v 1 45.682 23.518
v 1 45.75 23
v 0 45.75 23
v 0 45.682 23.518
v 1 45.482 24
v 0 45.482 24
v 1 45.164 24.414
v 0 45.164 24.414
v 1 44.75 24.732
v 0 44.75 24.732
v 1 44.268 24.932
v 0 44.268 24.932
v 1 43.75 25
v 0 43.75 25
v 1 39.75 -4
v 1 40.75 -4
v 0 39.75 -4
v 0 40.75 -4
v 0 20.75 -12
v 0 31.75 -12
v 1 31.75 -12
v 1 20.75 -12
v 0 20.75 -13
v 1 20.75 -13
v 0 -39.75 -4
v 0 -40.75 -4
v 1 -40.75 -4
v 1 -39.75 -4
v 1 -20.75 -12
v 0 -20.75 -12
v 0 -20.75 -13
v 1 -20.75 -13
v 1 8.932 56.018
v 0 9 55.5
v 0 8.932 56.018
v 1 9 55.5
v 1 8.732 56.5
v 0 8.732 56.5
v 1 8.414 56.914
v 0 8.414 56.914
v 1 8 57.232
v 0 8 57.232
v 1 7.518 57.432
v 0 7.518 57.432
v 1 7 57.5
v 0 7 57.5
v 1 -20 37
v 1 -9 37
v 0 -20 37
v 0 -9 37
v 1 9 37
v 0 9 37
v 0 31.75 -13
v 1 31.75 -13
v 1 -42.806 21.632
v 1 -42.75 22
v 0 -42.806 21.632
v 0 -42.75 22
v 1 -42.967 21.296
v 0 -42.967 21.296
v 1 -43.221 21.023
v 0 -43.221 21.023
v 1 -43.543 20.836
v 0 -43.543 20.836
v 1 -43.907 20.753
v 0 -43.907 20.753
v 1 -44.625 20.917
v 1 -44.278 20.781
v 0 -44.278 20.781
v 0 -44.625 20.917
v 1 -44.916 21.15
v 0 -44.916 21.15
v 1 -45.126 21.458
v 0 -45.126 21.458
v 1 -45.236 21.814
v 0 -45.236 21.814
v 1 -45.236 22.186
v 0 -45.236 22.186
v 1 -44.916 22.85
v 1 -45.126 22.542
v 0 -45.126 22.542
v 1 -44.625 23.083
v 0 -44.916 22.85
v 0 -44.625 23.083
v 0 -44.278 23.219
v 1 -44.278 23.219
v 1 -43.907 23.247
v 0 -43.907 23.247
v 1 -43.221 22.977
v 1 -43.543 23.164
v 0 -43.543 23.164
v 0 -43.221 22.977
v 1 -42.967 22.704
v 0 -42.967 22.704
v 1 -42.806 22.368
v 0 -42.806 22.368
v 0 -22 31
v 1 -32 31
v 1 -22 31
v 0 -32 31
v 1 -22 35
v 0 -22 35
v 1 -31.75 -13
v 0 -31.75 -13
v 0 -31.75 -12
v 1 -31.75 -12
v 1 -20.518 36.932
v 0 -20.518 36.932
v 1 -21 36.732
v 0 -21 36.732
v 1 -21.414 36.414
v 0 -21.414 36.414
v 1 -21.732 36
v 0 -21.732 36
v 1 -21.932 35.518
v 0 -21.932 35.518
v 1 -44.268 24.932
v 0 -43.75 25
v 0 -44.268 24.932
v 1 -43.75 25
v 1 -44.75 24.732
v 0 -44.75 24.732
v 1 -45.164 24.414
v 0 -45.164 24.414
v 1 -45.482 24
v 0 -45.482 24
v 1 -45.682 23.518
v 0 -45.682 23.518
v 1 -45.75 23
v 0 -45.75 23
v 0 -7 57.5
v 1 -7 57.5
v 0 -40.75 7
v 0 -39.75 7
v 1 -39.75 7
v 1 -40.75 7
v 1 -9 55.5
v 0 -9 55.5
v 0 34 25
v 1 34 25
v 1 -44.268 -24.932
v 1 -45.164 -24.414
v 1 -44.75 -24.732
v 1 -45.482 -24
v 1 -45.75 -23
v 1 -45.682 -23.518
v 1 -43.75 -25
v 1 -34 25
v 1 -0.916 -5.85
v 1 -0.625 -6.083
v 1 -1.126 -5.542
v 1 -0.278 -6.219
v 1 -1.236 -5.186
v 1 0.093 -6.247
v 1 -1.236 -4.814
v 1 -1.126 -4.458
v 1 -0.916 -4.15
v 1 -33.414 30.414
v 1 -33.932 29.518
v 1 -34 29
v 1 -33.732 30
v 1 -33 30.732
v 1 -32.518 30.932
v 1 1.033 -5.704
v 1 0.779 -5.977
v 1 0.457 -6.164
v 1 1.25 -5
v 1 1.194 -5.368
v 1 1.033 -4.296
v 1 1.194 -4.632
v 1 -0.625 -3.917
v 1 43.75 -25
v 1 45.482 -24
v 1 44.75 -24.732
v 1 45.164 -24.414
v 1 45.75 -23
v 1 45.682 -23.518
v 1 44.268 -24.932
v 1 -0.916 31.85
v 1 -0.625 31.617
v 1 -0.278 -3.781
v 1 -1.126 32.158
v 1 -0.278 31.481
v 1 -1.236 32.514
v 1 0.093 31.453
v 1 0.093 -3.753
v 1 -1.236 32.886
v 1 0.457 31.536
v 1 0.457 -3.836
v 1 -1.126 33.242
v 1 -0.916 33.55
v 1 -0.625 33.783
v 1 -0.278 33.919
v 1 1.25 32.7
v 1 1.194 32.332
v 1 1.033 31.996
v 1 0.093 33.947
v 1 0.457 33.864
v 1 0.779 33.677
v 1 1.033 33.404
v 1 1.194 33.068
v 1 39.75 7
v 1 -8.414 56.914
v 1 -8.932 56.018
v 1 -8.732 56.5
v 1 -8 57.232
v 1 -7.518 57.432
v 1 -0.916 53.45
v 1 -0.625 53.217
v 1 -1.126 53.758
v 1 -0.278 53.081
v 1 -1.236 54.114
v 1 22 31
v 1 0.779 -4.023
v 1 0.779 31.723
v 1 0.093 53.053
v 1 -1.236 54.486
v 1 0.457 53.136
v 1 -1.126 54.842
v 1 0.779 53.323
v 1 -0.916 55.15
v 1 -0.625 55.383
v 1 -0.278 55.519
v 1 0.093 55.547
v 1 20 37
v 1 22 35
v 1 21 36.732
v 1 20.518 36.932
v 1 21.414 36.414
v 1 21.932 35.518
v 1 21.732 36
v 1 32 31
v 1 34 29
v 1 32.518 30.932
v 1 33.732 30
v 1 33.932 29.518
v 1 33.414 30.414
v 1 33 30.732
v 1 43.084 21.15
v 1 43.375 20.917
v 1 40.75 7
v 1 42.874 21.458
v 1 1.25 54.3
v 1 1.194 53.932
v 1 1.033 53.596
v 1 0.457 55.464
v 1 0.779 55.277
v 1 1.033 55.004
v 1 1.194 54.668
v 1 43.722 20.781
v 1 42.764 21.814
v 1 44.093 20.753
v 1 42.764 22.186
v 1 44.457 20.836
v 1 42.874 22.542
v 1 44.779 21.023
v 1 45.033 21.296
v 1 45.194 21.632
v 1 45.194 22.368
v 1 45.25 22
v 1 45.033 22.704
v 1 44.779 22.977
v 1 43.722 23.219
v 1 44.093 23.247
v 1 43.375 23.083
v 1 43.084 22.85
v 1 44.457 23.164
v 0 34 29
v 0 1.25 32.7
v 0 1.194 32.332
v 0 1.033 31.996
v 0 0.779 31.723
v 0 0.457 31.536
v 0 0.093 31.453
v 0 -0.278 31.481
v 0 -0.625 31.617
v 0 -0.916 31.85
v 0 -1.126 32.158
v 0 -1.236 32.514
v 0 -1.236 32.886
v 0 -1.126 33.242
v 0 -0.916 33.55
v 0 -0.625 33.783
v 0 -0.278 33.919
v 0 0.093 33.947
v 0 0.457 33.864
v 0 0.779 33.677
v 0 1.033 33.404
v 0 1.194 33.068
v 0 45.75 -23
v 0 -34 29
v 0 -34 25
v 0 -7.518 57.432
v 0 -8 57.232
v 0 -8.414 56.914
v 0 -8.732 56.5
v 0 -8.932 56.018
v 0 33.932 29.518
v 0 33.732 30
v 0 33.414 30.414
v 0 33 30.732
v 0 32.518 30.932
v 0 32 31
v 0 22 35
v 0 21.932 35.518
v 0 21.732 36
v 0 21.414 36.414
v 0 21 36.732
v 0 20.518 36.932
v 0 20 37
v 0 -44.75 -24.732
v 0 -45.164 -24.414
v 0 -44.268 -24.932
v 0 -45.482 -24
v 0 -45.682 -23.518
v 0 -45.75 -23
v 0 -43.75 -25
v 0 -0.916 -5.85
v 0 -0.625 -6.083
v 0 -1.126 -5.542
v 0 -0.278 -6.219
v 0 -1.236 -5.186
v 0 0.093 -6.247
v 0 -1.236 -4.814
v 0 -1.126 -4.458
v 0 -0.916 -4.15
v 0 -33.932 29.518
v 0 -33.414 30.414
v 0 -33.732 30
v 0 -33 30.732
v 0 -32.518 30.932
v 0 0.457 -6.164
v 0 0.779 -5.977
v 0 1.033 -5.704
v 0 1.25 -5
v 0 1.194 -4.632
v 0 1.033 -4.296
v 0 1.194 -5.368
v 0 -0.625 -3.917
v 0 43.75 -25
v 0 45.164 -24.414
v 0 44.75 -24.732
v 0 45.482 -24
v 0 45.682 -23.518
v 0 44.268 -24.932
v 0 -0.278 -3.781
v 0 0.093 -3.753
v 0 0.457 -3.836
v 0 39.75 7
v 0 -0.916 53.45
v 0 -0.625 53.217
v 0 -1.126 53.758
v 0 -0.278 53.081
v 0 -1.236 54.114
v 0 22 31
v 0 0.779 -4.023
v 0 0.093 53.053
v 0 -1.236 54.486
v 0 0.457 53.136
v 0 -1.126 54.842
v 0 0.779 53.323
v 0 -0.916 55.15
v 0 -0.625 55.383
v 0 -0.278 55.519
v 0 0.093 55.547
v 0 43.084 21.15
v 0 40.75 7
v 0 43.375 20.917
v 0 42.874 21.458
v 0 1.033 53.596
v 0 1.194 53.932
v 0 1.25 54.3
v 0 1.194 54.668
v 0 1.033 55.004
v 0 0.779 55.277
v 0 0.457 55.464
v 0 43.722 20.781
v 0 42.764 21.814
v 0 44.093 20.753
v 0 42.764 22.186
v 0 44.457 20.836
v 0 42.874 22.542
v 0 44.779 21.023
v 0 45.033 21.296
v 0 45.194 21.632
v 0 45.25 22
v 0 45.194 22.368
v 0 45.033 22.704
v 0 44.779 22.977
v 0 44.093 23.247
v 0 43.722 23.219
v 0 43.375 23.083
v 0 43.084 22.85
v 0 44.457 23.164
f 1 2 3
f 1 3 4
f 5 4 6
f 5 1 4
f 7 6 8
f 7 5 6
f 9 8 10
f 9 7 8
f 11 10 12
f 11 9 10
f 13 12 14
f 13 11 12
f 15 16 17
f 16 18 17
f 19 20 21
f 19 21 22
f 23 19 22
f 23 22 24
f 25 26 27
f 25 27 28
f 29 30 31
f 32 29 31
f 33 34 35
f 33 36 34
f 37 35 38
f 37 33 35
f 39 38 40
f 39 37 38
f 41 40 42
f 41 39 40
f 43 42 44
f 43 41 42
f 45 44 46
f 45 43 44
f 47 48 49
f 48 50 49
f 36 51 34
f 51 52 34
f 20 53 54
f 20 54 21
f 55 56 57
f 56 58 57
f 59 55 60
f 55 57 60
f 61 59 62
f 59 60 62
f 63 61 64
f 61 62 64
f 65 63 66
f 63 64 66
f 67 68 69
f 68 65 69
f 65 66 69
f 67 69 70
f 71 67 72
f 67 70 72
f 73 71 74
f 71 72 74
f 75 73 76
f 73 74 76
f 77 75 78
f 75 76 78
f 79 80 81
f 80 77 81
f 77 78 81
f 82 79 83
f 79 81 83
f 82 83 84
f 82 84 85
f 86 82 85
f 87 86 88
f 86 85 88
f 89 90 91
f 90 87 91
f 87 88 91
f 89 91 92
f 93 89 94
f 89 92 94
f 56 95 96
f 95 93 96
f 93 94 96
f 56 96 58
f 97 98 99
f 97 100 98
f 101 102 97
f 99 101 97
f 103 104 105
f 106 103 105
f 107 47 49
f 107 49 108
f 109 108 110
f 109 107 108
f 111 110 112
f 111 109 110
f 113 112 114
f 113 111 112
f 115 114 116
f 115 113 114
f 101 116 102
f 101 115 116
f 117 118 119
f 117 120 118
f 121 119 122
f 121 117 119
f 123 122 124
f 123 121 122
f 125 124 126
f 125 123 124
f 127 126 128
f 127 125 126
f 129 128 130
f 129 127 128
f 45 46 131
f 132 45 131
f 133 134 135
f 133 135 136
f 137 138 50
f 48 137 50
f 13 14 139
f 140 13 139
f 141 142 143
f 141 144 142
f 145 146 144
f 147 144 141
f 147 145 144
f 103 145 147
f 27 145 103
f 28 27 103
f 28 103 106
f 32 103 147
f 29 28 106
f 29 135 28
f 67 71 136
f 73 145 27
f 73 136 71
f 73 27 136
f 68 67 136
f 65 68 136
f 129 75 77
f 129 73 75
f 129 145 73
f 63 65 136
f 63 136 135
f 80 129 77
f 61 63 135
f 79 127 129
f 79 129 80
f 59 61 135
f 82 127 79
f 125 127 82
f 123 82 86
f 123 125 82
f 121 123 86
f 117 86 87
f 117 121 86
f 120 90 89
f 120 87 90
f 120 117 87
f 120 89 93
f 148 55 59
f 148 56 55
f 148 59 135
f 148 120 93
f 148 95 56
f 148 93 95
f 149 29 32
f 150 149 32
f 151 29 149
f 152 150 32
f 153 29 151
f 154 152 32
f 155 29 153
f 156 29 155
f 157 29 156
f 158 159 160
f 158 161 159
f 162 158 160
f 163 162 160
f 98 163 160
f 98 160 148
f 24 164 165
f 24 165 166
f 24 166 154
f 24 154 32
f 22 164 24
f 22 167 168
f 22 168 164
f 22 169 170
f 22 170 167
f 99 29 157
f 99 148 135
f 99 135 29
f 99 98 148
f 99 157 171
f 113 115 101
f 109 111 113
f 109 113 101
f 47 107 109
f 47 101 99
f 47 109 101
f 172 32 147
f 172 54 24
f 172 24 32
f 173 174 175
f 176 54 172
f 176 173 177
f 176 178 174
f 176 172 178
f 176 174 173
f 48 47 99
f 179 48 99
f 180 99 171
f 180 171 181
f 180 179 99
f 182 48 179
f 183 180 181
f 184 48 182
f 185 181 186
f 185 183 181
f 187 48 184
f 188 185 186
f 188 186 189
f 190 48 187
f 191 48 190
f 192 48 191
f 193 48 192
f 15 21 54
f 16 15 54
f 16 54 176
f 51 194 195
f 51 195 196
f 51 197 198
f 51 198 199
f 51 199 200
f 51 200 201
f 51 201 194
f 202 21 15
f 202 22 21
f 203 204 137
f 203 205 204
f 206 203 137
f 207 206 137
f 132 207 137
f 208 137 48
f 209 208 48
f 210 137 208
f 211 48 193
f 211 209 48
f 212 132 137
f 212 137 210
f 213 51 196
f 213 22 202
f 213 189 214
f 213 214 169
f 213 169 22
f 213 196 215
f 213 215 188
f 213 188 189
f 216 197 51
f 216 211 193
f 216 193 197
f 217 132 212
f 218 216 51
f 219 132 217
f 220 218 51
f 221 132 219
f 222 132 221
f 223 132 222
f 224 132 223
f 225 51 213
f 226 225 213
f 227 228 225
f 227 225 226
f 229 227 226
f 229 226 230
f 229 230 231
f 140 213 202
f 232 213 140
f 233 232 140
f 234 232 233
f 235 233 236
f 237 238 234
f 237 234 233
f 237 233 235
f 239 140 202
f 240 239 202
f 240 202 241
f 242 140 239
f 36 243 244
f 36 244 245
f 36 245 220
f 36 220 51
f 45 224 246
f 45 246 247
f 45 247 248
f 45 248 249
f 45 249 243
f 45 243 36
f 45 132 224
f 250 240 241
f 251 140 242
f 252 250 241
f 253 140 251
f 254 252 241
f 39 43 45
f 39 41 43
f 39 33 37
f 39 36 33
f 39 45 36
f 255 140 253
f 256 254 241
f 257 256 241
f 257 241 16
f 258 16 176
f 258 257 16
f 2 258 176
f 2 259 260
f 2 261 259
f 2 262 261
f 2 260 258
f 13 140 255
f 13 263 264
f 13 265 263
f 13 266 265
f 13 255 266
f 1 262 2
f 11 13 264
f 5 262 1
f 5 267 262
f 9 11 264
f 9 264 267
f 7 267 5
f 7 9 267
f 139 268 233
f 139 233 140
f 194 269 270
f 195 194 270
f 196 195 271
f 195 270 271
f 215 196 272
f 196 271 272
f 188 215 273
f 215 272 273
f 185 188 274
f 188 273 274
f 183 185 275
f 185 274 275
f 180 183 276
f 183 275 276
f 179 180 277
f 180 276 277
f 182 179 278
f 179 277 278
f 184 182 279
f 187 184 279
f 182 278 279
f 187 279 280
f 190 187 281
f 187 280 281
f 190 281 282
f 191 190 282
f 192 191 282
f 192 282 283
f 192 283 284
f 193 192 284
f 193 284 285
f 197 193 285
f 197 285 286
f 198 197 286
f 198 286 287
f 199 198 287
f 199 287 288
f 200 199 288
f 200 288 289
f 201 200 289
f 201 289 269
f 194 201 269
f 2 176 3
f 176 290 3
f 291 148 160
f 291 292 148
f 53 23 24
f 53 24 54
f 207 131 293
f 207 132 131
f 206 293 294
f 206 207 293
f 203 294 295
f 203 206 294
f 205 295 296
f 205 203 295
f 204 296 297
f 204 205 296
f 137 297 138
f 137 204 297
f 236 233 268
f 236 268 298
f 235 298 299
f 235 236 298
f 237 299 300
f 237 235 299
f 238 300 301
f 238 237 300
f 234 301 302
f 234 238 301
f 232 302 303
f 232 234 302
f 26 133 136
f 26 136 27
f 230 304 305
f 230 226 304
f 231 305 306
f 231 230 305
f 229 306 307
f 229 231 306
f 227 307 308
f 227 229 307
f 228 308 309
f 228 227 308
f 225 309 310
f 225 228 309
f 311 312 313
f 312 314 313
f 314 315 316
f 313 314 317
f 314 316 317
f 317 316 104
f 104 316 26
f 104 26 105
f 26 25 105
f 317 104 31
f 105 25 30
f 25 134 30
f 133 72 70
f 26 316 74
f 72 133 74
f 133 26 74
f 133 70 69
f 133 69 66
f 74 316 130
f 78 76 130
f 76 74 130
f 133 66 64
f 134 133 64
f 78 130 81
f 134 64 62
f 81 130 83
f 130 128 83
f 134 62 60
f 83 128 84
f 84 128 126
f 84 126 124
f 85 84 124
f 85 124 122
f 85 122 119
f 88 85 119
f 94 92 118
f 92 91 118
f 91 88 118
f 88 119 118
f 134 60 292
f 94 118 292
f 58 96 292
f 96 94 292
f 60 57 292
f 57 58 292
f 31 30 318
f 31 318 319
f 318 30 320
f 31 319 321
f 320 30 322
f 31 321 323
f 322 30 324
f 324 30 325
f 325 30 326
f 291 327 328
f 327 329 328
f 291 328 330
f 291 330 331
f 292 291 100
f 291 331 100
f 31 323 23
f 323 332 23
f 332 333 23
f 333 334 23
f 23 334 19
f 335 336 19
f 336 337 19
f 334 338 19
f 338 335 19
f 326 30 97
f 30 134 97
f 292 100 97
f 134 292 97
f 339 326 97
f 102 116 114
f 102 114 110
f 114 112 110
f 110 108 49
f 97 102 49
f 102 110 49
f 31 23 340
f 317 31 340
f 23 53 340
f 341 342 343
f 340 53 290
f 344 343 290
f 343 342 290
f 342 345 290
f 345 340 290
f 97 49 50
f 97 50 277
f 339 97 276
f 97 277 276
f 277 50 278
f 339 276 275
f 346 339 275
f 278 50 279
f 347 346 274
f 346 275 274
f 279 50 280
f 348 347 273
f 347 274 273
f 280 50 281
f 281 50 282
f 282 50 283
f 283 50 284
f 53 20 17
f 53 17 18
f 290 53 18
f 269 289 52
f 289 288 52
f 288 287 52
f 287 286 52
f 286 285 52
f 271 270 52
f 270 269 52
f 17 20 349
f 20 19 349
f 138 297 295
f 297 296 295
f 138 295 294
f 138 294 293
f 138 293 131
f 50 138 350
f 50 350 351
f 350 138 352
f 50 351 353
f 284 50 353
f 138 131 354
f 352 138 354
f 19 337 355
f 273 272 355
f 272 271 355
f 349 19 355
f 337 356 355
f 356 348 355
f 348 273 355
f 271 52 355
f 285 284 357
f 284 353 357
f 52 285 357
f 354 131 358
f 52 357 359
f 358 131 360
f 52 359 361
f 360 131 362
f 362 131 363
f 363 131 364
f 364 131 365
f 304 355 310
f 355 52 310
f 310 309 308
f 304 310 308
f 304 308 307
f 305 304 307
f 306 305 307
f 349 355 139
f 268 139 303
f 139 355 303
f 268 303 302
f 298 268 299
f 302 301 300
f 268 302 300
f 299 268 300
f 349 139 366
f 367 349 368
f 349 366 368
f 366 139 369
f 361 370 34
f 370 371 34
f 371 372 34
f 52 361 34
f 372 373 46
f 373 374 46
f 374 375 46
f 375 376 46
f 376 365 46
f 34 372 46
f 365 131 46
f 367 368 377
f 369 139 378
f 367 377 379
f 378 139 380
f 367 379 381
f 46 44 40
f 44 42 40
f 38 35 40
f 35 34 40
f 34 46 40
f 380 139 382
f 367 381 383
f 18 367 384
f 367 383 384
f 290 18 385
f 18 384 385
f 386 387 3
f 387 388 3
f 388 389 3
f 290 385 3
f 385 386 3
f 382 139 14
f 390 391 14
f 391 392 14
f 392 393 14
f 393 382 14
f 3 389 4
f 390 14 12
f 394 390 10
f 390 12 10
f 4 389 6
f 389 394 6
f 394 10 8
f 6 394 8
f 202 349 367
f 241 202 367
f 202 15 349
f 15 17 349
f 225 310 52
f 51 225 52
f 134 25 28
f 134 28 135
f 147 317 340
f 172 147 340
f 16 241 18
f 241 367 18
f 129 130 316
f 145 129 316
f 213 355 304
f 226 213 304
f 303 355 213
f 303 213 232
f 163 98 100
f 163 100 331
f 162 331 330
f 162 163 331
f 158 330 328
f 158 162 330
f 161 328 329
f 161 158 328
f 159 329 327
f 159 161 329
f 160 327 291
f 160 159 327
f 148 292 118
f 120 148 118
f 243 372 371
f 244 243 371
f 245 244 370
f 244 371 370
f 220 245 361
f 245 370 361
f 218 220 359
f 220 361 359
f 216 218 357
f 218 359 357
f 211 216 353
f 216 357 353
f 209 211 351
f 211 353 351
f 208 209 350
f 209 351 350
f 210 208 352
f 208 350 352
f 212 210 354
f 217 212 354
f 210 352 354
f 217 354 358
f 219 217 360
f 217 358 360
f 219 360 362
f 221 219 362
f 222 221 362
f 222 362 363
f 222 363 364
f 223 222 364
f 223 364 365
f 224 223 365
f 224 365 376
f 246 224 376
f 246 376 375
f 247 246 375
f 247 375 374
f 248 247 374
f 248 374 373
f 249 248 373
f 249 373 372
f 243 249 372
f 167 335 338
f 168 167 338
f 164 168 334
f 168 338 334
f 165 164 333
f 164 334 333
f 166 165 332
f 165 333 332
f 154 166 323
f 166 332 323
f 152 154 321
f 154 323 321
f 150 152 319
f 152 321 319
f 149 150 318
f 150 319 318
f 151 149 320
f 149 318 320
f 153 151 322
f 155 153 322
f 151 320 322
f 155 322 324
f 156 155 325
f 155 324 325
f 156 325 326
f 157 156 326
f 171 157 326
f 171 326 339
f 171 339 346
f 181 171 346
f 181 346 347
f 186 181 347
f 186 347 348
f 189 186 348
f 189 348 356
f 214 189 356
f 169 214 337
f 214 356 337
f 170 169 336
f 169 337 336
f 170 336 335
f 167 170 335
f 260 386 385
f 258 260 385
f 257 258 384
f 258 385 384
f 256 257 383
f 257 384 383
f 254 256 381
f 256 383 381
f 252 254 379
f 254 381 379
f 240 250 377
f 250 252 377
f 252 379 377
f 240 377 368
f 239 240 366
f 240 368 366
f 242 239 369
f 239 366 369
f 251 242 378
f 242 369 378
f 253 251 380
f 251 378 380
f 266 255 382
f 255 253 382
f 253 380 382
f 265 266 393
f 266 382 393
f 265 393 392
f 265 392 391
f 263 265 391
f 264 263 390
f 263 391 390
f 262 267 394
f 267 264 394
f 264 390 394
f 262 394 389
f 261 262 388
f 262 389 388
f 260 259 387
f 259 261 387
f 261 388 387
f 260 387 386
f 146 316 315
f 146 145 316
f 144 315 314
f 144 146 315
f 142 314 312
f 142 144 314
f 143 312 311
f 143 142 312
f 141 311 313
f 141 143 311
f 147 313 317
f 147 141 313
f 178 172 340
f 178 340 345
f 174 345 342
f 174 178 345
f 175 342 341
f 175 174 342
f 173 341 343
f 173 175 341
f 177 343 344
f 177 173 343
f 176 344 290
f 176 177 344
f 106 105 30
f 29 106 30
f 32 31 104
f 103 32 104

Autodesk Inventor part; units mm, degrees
ref_plane "YZ Plane" through (0, 0, 0) normal (1, 0, 0) x (0, 1, 0)
ref_plane "XZ Plane" through (0, 0, 0) normal (0, 1, 0) x (-1, 0, 0)
ref_plane "XY Plane" through (0, 0, 0) normal (0, 0, 1) x (1, 0, 0)
sketch "Sketch1" plane through (0, 0, 0) normal (1, 0, 0) x (0, 1, 0)
  line L0 (45.75, 25) -> (-45.75, 25)
  line L1 (-45.75, 25) -> (-45.75, -25)
  line L2 (-45.75, -25) -> (45.75, -25)
  line L3 (45.75, -25) -> (45.75, 25)
  circle A0 centre (44, 22) radius 1.25
  line L4 (0, 25) -> (0, -25) construction
  circle A1 centre (-44, 22) radius 1.25
  line L5 (-34, 25) -> (-34, 31)
  line L6 (-34, 31) -> (34, 31)
  line L7 (34, 31) -> (34, 25)
  line L8 (-31.75, -12) -> (-20.75, -12)
  line L9 (-20.75, -12) -> (-20.75, -13)
  line L10 (-20.75, -13) -> (-31.75, -13)
  line L11 (-31.75, -13) -> (-31.75, -12)
  line L12 (31.75, -12) -> (20.75, -12)
  line L13 (20.75, -12) -> (20.75, -13)
  line L14 (20.75, -13) -> (31.75, -13)
  line L15 (31.75, -13) -> (31.75, -12)
  line L16 (-39.75, 7) -> (-40.75, 7)
  line L17 (-40.75, 7) -> (-40.75, -4)
  line L18 (-40.75, -4) -> (-39.75, -4)
  line L19 (-39.75, -4) -> (-39.75, 7)
  line L20 (39.75, 7) -> (40.75, 7)
  line L21 (40.75, 7) -> (40.75, -4)
  line L22 (40.75, -4) -> (39.75, -4)
  line L23 (39.75, -4) -> (39.75, 7)
  circle A2 centre (0, -5) radius 1.25
  circle A3 centre (0, 54.3) radius 1.25
  line L24 (22, 31) -> (22, 37)
  line L25 (22, 37) -> (9, 37)
  line L26 (9, 37) -> (9, 57.5)
  line L27 (-9, 57.5) -> (-9, 37)
  line L28 (-9, 37) -> (-22, 37)
  line L29 (-22, 37) -> (-22, 31)
  line L30 (9, 57.5) -> (-9, 57.5)
  circle A4 centre (0, 32.7) radius 1.25
  point P0 (0, 0)
  point P1 (45.75, 0)
  dimension "d0" = 50
  dimension "d1" = 91.5
  dimension "d2" = 2.5
  dimension "d4" = 3
  dimension "d11" = 11.75
  dimension "d12" = 6
  dimension "d13" = 11.75
  dimension "d18" = 1
  dimension "d19" = 11
  dimension "d20" = 14
  dimension "d21" = 12
  dimension "d24" = 21
  dimension "d25" = 1
  dimension "d26" = 5
  dimension "d27" = 11
  dimension "d28" = 30
  dimension "d29" = 2.5
  dimension "d30" = 2.5
  dimension "d33" = 6
  dimension "d34" = 25
  dimension "d35" = 25
  dimension "d37" = 12
  dimension "d38" = 12
  dimension "d39" = 9
  dimension "d41" = 26.5
  dimension "d42" = 3.2
  dimension "d43" = 2.5
  dimension "d44" = 37.7
  dimension "d45" = 10
extrude "Extrusion1" add sketch "Sketch1" along normal blind 1 contours L3 L2 L1 L0 | L0 L5 L6 L7 | L6 L29 L28 L27 L30 L26 L25 L24 | L8 L9 L10 L11 | L15 L14 L13 L12 | L19 L18 L17 L16 | L20 L21 L22 L23 | A2 | A3 | A4
fillet "Fillet1" radius 2 10 edges at (0.5, -45.75, 25) (0.5, -34, 31) (0.5, 34, 31) (0.5, 45.75, 25) (0.5, -45.75, -25) (0.5, 45.75, -25) (0.5, 9, 57.5) (0.5, -9, 57.5) (0.5, 22, 37) (0.5, -22, 37)
extrude "Extrusion2" cut sketch "Sketch1" along normal up to next contours L8 L9 L10 L11 | L15 L14 L13 L12 | L19 L18 L17 L16 | L20 L21 L22 L23 | A2 | A3 | A4
properties part number "PCB"
